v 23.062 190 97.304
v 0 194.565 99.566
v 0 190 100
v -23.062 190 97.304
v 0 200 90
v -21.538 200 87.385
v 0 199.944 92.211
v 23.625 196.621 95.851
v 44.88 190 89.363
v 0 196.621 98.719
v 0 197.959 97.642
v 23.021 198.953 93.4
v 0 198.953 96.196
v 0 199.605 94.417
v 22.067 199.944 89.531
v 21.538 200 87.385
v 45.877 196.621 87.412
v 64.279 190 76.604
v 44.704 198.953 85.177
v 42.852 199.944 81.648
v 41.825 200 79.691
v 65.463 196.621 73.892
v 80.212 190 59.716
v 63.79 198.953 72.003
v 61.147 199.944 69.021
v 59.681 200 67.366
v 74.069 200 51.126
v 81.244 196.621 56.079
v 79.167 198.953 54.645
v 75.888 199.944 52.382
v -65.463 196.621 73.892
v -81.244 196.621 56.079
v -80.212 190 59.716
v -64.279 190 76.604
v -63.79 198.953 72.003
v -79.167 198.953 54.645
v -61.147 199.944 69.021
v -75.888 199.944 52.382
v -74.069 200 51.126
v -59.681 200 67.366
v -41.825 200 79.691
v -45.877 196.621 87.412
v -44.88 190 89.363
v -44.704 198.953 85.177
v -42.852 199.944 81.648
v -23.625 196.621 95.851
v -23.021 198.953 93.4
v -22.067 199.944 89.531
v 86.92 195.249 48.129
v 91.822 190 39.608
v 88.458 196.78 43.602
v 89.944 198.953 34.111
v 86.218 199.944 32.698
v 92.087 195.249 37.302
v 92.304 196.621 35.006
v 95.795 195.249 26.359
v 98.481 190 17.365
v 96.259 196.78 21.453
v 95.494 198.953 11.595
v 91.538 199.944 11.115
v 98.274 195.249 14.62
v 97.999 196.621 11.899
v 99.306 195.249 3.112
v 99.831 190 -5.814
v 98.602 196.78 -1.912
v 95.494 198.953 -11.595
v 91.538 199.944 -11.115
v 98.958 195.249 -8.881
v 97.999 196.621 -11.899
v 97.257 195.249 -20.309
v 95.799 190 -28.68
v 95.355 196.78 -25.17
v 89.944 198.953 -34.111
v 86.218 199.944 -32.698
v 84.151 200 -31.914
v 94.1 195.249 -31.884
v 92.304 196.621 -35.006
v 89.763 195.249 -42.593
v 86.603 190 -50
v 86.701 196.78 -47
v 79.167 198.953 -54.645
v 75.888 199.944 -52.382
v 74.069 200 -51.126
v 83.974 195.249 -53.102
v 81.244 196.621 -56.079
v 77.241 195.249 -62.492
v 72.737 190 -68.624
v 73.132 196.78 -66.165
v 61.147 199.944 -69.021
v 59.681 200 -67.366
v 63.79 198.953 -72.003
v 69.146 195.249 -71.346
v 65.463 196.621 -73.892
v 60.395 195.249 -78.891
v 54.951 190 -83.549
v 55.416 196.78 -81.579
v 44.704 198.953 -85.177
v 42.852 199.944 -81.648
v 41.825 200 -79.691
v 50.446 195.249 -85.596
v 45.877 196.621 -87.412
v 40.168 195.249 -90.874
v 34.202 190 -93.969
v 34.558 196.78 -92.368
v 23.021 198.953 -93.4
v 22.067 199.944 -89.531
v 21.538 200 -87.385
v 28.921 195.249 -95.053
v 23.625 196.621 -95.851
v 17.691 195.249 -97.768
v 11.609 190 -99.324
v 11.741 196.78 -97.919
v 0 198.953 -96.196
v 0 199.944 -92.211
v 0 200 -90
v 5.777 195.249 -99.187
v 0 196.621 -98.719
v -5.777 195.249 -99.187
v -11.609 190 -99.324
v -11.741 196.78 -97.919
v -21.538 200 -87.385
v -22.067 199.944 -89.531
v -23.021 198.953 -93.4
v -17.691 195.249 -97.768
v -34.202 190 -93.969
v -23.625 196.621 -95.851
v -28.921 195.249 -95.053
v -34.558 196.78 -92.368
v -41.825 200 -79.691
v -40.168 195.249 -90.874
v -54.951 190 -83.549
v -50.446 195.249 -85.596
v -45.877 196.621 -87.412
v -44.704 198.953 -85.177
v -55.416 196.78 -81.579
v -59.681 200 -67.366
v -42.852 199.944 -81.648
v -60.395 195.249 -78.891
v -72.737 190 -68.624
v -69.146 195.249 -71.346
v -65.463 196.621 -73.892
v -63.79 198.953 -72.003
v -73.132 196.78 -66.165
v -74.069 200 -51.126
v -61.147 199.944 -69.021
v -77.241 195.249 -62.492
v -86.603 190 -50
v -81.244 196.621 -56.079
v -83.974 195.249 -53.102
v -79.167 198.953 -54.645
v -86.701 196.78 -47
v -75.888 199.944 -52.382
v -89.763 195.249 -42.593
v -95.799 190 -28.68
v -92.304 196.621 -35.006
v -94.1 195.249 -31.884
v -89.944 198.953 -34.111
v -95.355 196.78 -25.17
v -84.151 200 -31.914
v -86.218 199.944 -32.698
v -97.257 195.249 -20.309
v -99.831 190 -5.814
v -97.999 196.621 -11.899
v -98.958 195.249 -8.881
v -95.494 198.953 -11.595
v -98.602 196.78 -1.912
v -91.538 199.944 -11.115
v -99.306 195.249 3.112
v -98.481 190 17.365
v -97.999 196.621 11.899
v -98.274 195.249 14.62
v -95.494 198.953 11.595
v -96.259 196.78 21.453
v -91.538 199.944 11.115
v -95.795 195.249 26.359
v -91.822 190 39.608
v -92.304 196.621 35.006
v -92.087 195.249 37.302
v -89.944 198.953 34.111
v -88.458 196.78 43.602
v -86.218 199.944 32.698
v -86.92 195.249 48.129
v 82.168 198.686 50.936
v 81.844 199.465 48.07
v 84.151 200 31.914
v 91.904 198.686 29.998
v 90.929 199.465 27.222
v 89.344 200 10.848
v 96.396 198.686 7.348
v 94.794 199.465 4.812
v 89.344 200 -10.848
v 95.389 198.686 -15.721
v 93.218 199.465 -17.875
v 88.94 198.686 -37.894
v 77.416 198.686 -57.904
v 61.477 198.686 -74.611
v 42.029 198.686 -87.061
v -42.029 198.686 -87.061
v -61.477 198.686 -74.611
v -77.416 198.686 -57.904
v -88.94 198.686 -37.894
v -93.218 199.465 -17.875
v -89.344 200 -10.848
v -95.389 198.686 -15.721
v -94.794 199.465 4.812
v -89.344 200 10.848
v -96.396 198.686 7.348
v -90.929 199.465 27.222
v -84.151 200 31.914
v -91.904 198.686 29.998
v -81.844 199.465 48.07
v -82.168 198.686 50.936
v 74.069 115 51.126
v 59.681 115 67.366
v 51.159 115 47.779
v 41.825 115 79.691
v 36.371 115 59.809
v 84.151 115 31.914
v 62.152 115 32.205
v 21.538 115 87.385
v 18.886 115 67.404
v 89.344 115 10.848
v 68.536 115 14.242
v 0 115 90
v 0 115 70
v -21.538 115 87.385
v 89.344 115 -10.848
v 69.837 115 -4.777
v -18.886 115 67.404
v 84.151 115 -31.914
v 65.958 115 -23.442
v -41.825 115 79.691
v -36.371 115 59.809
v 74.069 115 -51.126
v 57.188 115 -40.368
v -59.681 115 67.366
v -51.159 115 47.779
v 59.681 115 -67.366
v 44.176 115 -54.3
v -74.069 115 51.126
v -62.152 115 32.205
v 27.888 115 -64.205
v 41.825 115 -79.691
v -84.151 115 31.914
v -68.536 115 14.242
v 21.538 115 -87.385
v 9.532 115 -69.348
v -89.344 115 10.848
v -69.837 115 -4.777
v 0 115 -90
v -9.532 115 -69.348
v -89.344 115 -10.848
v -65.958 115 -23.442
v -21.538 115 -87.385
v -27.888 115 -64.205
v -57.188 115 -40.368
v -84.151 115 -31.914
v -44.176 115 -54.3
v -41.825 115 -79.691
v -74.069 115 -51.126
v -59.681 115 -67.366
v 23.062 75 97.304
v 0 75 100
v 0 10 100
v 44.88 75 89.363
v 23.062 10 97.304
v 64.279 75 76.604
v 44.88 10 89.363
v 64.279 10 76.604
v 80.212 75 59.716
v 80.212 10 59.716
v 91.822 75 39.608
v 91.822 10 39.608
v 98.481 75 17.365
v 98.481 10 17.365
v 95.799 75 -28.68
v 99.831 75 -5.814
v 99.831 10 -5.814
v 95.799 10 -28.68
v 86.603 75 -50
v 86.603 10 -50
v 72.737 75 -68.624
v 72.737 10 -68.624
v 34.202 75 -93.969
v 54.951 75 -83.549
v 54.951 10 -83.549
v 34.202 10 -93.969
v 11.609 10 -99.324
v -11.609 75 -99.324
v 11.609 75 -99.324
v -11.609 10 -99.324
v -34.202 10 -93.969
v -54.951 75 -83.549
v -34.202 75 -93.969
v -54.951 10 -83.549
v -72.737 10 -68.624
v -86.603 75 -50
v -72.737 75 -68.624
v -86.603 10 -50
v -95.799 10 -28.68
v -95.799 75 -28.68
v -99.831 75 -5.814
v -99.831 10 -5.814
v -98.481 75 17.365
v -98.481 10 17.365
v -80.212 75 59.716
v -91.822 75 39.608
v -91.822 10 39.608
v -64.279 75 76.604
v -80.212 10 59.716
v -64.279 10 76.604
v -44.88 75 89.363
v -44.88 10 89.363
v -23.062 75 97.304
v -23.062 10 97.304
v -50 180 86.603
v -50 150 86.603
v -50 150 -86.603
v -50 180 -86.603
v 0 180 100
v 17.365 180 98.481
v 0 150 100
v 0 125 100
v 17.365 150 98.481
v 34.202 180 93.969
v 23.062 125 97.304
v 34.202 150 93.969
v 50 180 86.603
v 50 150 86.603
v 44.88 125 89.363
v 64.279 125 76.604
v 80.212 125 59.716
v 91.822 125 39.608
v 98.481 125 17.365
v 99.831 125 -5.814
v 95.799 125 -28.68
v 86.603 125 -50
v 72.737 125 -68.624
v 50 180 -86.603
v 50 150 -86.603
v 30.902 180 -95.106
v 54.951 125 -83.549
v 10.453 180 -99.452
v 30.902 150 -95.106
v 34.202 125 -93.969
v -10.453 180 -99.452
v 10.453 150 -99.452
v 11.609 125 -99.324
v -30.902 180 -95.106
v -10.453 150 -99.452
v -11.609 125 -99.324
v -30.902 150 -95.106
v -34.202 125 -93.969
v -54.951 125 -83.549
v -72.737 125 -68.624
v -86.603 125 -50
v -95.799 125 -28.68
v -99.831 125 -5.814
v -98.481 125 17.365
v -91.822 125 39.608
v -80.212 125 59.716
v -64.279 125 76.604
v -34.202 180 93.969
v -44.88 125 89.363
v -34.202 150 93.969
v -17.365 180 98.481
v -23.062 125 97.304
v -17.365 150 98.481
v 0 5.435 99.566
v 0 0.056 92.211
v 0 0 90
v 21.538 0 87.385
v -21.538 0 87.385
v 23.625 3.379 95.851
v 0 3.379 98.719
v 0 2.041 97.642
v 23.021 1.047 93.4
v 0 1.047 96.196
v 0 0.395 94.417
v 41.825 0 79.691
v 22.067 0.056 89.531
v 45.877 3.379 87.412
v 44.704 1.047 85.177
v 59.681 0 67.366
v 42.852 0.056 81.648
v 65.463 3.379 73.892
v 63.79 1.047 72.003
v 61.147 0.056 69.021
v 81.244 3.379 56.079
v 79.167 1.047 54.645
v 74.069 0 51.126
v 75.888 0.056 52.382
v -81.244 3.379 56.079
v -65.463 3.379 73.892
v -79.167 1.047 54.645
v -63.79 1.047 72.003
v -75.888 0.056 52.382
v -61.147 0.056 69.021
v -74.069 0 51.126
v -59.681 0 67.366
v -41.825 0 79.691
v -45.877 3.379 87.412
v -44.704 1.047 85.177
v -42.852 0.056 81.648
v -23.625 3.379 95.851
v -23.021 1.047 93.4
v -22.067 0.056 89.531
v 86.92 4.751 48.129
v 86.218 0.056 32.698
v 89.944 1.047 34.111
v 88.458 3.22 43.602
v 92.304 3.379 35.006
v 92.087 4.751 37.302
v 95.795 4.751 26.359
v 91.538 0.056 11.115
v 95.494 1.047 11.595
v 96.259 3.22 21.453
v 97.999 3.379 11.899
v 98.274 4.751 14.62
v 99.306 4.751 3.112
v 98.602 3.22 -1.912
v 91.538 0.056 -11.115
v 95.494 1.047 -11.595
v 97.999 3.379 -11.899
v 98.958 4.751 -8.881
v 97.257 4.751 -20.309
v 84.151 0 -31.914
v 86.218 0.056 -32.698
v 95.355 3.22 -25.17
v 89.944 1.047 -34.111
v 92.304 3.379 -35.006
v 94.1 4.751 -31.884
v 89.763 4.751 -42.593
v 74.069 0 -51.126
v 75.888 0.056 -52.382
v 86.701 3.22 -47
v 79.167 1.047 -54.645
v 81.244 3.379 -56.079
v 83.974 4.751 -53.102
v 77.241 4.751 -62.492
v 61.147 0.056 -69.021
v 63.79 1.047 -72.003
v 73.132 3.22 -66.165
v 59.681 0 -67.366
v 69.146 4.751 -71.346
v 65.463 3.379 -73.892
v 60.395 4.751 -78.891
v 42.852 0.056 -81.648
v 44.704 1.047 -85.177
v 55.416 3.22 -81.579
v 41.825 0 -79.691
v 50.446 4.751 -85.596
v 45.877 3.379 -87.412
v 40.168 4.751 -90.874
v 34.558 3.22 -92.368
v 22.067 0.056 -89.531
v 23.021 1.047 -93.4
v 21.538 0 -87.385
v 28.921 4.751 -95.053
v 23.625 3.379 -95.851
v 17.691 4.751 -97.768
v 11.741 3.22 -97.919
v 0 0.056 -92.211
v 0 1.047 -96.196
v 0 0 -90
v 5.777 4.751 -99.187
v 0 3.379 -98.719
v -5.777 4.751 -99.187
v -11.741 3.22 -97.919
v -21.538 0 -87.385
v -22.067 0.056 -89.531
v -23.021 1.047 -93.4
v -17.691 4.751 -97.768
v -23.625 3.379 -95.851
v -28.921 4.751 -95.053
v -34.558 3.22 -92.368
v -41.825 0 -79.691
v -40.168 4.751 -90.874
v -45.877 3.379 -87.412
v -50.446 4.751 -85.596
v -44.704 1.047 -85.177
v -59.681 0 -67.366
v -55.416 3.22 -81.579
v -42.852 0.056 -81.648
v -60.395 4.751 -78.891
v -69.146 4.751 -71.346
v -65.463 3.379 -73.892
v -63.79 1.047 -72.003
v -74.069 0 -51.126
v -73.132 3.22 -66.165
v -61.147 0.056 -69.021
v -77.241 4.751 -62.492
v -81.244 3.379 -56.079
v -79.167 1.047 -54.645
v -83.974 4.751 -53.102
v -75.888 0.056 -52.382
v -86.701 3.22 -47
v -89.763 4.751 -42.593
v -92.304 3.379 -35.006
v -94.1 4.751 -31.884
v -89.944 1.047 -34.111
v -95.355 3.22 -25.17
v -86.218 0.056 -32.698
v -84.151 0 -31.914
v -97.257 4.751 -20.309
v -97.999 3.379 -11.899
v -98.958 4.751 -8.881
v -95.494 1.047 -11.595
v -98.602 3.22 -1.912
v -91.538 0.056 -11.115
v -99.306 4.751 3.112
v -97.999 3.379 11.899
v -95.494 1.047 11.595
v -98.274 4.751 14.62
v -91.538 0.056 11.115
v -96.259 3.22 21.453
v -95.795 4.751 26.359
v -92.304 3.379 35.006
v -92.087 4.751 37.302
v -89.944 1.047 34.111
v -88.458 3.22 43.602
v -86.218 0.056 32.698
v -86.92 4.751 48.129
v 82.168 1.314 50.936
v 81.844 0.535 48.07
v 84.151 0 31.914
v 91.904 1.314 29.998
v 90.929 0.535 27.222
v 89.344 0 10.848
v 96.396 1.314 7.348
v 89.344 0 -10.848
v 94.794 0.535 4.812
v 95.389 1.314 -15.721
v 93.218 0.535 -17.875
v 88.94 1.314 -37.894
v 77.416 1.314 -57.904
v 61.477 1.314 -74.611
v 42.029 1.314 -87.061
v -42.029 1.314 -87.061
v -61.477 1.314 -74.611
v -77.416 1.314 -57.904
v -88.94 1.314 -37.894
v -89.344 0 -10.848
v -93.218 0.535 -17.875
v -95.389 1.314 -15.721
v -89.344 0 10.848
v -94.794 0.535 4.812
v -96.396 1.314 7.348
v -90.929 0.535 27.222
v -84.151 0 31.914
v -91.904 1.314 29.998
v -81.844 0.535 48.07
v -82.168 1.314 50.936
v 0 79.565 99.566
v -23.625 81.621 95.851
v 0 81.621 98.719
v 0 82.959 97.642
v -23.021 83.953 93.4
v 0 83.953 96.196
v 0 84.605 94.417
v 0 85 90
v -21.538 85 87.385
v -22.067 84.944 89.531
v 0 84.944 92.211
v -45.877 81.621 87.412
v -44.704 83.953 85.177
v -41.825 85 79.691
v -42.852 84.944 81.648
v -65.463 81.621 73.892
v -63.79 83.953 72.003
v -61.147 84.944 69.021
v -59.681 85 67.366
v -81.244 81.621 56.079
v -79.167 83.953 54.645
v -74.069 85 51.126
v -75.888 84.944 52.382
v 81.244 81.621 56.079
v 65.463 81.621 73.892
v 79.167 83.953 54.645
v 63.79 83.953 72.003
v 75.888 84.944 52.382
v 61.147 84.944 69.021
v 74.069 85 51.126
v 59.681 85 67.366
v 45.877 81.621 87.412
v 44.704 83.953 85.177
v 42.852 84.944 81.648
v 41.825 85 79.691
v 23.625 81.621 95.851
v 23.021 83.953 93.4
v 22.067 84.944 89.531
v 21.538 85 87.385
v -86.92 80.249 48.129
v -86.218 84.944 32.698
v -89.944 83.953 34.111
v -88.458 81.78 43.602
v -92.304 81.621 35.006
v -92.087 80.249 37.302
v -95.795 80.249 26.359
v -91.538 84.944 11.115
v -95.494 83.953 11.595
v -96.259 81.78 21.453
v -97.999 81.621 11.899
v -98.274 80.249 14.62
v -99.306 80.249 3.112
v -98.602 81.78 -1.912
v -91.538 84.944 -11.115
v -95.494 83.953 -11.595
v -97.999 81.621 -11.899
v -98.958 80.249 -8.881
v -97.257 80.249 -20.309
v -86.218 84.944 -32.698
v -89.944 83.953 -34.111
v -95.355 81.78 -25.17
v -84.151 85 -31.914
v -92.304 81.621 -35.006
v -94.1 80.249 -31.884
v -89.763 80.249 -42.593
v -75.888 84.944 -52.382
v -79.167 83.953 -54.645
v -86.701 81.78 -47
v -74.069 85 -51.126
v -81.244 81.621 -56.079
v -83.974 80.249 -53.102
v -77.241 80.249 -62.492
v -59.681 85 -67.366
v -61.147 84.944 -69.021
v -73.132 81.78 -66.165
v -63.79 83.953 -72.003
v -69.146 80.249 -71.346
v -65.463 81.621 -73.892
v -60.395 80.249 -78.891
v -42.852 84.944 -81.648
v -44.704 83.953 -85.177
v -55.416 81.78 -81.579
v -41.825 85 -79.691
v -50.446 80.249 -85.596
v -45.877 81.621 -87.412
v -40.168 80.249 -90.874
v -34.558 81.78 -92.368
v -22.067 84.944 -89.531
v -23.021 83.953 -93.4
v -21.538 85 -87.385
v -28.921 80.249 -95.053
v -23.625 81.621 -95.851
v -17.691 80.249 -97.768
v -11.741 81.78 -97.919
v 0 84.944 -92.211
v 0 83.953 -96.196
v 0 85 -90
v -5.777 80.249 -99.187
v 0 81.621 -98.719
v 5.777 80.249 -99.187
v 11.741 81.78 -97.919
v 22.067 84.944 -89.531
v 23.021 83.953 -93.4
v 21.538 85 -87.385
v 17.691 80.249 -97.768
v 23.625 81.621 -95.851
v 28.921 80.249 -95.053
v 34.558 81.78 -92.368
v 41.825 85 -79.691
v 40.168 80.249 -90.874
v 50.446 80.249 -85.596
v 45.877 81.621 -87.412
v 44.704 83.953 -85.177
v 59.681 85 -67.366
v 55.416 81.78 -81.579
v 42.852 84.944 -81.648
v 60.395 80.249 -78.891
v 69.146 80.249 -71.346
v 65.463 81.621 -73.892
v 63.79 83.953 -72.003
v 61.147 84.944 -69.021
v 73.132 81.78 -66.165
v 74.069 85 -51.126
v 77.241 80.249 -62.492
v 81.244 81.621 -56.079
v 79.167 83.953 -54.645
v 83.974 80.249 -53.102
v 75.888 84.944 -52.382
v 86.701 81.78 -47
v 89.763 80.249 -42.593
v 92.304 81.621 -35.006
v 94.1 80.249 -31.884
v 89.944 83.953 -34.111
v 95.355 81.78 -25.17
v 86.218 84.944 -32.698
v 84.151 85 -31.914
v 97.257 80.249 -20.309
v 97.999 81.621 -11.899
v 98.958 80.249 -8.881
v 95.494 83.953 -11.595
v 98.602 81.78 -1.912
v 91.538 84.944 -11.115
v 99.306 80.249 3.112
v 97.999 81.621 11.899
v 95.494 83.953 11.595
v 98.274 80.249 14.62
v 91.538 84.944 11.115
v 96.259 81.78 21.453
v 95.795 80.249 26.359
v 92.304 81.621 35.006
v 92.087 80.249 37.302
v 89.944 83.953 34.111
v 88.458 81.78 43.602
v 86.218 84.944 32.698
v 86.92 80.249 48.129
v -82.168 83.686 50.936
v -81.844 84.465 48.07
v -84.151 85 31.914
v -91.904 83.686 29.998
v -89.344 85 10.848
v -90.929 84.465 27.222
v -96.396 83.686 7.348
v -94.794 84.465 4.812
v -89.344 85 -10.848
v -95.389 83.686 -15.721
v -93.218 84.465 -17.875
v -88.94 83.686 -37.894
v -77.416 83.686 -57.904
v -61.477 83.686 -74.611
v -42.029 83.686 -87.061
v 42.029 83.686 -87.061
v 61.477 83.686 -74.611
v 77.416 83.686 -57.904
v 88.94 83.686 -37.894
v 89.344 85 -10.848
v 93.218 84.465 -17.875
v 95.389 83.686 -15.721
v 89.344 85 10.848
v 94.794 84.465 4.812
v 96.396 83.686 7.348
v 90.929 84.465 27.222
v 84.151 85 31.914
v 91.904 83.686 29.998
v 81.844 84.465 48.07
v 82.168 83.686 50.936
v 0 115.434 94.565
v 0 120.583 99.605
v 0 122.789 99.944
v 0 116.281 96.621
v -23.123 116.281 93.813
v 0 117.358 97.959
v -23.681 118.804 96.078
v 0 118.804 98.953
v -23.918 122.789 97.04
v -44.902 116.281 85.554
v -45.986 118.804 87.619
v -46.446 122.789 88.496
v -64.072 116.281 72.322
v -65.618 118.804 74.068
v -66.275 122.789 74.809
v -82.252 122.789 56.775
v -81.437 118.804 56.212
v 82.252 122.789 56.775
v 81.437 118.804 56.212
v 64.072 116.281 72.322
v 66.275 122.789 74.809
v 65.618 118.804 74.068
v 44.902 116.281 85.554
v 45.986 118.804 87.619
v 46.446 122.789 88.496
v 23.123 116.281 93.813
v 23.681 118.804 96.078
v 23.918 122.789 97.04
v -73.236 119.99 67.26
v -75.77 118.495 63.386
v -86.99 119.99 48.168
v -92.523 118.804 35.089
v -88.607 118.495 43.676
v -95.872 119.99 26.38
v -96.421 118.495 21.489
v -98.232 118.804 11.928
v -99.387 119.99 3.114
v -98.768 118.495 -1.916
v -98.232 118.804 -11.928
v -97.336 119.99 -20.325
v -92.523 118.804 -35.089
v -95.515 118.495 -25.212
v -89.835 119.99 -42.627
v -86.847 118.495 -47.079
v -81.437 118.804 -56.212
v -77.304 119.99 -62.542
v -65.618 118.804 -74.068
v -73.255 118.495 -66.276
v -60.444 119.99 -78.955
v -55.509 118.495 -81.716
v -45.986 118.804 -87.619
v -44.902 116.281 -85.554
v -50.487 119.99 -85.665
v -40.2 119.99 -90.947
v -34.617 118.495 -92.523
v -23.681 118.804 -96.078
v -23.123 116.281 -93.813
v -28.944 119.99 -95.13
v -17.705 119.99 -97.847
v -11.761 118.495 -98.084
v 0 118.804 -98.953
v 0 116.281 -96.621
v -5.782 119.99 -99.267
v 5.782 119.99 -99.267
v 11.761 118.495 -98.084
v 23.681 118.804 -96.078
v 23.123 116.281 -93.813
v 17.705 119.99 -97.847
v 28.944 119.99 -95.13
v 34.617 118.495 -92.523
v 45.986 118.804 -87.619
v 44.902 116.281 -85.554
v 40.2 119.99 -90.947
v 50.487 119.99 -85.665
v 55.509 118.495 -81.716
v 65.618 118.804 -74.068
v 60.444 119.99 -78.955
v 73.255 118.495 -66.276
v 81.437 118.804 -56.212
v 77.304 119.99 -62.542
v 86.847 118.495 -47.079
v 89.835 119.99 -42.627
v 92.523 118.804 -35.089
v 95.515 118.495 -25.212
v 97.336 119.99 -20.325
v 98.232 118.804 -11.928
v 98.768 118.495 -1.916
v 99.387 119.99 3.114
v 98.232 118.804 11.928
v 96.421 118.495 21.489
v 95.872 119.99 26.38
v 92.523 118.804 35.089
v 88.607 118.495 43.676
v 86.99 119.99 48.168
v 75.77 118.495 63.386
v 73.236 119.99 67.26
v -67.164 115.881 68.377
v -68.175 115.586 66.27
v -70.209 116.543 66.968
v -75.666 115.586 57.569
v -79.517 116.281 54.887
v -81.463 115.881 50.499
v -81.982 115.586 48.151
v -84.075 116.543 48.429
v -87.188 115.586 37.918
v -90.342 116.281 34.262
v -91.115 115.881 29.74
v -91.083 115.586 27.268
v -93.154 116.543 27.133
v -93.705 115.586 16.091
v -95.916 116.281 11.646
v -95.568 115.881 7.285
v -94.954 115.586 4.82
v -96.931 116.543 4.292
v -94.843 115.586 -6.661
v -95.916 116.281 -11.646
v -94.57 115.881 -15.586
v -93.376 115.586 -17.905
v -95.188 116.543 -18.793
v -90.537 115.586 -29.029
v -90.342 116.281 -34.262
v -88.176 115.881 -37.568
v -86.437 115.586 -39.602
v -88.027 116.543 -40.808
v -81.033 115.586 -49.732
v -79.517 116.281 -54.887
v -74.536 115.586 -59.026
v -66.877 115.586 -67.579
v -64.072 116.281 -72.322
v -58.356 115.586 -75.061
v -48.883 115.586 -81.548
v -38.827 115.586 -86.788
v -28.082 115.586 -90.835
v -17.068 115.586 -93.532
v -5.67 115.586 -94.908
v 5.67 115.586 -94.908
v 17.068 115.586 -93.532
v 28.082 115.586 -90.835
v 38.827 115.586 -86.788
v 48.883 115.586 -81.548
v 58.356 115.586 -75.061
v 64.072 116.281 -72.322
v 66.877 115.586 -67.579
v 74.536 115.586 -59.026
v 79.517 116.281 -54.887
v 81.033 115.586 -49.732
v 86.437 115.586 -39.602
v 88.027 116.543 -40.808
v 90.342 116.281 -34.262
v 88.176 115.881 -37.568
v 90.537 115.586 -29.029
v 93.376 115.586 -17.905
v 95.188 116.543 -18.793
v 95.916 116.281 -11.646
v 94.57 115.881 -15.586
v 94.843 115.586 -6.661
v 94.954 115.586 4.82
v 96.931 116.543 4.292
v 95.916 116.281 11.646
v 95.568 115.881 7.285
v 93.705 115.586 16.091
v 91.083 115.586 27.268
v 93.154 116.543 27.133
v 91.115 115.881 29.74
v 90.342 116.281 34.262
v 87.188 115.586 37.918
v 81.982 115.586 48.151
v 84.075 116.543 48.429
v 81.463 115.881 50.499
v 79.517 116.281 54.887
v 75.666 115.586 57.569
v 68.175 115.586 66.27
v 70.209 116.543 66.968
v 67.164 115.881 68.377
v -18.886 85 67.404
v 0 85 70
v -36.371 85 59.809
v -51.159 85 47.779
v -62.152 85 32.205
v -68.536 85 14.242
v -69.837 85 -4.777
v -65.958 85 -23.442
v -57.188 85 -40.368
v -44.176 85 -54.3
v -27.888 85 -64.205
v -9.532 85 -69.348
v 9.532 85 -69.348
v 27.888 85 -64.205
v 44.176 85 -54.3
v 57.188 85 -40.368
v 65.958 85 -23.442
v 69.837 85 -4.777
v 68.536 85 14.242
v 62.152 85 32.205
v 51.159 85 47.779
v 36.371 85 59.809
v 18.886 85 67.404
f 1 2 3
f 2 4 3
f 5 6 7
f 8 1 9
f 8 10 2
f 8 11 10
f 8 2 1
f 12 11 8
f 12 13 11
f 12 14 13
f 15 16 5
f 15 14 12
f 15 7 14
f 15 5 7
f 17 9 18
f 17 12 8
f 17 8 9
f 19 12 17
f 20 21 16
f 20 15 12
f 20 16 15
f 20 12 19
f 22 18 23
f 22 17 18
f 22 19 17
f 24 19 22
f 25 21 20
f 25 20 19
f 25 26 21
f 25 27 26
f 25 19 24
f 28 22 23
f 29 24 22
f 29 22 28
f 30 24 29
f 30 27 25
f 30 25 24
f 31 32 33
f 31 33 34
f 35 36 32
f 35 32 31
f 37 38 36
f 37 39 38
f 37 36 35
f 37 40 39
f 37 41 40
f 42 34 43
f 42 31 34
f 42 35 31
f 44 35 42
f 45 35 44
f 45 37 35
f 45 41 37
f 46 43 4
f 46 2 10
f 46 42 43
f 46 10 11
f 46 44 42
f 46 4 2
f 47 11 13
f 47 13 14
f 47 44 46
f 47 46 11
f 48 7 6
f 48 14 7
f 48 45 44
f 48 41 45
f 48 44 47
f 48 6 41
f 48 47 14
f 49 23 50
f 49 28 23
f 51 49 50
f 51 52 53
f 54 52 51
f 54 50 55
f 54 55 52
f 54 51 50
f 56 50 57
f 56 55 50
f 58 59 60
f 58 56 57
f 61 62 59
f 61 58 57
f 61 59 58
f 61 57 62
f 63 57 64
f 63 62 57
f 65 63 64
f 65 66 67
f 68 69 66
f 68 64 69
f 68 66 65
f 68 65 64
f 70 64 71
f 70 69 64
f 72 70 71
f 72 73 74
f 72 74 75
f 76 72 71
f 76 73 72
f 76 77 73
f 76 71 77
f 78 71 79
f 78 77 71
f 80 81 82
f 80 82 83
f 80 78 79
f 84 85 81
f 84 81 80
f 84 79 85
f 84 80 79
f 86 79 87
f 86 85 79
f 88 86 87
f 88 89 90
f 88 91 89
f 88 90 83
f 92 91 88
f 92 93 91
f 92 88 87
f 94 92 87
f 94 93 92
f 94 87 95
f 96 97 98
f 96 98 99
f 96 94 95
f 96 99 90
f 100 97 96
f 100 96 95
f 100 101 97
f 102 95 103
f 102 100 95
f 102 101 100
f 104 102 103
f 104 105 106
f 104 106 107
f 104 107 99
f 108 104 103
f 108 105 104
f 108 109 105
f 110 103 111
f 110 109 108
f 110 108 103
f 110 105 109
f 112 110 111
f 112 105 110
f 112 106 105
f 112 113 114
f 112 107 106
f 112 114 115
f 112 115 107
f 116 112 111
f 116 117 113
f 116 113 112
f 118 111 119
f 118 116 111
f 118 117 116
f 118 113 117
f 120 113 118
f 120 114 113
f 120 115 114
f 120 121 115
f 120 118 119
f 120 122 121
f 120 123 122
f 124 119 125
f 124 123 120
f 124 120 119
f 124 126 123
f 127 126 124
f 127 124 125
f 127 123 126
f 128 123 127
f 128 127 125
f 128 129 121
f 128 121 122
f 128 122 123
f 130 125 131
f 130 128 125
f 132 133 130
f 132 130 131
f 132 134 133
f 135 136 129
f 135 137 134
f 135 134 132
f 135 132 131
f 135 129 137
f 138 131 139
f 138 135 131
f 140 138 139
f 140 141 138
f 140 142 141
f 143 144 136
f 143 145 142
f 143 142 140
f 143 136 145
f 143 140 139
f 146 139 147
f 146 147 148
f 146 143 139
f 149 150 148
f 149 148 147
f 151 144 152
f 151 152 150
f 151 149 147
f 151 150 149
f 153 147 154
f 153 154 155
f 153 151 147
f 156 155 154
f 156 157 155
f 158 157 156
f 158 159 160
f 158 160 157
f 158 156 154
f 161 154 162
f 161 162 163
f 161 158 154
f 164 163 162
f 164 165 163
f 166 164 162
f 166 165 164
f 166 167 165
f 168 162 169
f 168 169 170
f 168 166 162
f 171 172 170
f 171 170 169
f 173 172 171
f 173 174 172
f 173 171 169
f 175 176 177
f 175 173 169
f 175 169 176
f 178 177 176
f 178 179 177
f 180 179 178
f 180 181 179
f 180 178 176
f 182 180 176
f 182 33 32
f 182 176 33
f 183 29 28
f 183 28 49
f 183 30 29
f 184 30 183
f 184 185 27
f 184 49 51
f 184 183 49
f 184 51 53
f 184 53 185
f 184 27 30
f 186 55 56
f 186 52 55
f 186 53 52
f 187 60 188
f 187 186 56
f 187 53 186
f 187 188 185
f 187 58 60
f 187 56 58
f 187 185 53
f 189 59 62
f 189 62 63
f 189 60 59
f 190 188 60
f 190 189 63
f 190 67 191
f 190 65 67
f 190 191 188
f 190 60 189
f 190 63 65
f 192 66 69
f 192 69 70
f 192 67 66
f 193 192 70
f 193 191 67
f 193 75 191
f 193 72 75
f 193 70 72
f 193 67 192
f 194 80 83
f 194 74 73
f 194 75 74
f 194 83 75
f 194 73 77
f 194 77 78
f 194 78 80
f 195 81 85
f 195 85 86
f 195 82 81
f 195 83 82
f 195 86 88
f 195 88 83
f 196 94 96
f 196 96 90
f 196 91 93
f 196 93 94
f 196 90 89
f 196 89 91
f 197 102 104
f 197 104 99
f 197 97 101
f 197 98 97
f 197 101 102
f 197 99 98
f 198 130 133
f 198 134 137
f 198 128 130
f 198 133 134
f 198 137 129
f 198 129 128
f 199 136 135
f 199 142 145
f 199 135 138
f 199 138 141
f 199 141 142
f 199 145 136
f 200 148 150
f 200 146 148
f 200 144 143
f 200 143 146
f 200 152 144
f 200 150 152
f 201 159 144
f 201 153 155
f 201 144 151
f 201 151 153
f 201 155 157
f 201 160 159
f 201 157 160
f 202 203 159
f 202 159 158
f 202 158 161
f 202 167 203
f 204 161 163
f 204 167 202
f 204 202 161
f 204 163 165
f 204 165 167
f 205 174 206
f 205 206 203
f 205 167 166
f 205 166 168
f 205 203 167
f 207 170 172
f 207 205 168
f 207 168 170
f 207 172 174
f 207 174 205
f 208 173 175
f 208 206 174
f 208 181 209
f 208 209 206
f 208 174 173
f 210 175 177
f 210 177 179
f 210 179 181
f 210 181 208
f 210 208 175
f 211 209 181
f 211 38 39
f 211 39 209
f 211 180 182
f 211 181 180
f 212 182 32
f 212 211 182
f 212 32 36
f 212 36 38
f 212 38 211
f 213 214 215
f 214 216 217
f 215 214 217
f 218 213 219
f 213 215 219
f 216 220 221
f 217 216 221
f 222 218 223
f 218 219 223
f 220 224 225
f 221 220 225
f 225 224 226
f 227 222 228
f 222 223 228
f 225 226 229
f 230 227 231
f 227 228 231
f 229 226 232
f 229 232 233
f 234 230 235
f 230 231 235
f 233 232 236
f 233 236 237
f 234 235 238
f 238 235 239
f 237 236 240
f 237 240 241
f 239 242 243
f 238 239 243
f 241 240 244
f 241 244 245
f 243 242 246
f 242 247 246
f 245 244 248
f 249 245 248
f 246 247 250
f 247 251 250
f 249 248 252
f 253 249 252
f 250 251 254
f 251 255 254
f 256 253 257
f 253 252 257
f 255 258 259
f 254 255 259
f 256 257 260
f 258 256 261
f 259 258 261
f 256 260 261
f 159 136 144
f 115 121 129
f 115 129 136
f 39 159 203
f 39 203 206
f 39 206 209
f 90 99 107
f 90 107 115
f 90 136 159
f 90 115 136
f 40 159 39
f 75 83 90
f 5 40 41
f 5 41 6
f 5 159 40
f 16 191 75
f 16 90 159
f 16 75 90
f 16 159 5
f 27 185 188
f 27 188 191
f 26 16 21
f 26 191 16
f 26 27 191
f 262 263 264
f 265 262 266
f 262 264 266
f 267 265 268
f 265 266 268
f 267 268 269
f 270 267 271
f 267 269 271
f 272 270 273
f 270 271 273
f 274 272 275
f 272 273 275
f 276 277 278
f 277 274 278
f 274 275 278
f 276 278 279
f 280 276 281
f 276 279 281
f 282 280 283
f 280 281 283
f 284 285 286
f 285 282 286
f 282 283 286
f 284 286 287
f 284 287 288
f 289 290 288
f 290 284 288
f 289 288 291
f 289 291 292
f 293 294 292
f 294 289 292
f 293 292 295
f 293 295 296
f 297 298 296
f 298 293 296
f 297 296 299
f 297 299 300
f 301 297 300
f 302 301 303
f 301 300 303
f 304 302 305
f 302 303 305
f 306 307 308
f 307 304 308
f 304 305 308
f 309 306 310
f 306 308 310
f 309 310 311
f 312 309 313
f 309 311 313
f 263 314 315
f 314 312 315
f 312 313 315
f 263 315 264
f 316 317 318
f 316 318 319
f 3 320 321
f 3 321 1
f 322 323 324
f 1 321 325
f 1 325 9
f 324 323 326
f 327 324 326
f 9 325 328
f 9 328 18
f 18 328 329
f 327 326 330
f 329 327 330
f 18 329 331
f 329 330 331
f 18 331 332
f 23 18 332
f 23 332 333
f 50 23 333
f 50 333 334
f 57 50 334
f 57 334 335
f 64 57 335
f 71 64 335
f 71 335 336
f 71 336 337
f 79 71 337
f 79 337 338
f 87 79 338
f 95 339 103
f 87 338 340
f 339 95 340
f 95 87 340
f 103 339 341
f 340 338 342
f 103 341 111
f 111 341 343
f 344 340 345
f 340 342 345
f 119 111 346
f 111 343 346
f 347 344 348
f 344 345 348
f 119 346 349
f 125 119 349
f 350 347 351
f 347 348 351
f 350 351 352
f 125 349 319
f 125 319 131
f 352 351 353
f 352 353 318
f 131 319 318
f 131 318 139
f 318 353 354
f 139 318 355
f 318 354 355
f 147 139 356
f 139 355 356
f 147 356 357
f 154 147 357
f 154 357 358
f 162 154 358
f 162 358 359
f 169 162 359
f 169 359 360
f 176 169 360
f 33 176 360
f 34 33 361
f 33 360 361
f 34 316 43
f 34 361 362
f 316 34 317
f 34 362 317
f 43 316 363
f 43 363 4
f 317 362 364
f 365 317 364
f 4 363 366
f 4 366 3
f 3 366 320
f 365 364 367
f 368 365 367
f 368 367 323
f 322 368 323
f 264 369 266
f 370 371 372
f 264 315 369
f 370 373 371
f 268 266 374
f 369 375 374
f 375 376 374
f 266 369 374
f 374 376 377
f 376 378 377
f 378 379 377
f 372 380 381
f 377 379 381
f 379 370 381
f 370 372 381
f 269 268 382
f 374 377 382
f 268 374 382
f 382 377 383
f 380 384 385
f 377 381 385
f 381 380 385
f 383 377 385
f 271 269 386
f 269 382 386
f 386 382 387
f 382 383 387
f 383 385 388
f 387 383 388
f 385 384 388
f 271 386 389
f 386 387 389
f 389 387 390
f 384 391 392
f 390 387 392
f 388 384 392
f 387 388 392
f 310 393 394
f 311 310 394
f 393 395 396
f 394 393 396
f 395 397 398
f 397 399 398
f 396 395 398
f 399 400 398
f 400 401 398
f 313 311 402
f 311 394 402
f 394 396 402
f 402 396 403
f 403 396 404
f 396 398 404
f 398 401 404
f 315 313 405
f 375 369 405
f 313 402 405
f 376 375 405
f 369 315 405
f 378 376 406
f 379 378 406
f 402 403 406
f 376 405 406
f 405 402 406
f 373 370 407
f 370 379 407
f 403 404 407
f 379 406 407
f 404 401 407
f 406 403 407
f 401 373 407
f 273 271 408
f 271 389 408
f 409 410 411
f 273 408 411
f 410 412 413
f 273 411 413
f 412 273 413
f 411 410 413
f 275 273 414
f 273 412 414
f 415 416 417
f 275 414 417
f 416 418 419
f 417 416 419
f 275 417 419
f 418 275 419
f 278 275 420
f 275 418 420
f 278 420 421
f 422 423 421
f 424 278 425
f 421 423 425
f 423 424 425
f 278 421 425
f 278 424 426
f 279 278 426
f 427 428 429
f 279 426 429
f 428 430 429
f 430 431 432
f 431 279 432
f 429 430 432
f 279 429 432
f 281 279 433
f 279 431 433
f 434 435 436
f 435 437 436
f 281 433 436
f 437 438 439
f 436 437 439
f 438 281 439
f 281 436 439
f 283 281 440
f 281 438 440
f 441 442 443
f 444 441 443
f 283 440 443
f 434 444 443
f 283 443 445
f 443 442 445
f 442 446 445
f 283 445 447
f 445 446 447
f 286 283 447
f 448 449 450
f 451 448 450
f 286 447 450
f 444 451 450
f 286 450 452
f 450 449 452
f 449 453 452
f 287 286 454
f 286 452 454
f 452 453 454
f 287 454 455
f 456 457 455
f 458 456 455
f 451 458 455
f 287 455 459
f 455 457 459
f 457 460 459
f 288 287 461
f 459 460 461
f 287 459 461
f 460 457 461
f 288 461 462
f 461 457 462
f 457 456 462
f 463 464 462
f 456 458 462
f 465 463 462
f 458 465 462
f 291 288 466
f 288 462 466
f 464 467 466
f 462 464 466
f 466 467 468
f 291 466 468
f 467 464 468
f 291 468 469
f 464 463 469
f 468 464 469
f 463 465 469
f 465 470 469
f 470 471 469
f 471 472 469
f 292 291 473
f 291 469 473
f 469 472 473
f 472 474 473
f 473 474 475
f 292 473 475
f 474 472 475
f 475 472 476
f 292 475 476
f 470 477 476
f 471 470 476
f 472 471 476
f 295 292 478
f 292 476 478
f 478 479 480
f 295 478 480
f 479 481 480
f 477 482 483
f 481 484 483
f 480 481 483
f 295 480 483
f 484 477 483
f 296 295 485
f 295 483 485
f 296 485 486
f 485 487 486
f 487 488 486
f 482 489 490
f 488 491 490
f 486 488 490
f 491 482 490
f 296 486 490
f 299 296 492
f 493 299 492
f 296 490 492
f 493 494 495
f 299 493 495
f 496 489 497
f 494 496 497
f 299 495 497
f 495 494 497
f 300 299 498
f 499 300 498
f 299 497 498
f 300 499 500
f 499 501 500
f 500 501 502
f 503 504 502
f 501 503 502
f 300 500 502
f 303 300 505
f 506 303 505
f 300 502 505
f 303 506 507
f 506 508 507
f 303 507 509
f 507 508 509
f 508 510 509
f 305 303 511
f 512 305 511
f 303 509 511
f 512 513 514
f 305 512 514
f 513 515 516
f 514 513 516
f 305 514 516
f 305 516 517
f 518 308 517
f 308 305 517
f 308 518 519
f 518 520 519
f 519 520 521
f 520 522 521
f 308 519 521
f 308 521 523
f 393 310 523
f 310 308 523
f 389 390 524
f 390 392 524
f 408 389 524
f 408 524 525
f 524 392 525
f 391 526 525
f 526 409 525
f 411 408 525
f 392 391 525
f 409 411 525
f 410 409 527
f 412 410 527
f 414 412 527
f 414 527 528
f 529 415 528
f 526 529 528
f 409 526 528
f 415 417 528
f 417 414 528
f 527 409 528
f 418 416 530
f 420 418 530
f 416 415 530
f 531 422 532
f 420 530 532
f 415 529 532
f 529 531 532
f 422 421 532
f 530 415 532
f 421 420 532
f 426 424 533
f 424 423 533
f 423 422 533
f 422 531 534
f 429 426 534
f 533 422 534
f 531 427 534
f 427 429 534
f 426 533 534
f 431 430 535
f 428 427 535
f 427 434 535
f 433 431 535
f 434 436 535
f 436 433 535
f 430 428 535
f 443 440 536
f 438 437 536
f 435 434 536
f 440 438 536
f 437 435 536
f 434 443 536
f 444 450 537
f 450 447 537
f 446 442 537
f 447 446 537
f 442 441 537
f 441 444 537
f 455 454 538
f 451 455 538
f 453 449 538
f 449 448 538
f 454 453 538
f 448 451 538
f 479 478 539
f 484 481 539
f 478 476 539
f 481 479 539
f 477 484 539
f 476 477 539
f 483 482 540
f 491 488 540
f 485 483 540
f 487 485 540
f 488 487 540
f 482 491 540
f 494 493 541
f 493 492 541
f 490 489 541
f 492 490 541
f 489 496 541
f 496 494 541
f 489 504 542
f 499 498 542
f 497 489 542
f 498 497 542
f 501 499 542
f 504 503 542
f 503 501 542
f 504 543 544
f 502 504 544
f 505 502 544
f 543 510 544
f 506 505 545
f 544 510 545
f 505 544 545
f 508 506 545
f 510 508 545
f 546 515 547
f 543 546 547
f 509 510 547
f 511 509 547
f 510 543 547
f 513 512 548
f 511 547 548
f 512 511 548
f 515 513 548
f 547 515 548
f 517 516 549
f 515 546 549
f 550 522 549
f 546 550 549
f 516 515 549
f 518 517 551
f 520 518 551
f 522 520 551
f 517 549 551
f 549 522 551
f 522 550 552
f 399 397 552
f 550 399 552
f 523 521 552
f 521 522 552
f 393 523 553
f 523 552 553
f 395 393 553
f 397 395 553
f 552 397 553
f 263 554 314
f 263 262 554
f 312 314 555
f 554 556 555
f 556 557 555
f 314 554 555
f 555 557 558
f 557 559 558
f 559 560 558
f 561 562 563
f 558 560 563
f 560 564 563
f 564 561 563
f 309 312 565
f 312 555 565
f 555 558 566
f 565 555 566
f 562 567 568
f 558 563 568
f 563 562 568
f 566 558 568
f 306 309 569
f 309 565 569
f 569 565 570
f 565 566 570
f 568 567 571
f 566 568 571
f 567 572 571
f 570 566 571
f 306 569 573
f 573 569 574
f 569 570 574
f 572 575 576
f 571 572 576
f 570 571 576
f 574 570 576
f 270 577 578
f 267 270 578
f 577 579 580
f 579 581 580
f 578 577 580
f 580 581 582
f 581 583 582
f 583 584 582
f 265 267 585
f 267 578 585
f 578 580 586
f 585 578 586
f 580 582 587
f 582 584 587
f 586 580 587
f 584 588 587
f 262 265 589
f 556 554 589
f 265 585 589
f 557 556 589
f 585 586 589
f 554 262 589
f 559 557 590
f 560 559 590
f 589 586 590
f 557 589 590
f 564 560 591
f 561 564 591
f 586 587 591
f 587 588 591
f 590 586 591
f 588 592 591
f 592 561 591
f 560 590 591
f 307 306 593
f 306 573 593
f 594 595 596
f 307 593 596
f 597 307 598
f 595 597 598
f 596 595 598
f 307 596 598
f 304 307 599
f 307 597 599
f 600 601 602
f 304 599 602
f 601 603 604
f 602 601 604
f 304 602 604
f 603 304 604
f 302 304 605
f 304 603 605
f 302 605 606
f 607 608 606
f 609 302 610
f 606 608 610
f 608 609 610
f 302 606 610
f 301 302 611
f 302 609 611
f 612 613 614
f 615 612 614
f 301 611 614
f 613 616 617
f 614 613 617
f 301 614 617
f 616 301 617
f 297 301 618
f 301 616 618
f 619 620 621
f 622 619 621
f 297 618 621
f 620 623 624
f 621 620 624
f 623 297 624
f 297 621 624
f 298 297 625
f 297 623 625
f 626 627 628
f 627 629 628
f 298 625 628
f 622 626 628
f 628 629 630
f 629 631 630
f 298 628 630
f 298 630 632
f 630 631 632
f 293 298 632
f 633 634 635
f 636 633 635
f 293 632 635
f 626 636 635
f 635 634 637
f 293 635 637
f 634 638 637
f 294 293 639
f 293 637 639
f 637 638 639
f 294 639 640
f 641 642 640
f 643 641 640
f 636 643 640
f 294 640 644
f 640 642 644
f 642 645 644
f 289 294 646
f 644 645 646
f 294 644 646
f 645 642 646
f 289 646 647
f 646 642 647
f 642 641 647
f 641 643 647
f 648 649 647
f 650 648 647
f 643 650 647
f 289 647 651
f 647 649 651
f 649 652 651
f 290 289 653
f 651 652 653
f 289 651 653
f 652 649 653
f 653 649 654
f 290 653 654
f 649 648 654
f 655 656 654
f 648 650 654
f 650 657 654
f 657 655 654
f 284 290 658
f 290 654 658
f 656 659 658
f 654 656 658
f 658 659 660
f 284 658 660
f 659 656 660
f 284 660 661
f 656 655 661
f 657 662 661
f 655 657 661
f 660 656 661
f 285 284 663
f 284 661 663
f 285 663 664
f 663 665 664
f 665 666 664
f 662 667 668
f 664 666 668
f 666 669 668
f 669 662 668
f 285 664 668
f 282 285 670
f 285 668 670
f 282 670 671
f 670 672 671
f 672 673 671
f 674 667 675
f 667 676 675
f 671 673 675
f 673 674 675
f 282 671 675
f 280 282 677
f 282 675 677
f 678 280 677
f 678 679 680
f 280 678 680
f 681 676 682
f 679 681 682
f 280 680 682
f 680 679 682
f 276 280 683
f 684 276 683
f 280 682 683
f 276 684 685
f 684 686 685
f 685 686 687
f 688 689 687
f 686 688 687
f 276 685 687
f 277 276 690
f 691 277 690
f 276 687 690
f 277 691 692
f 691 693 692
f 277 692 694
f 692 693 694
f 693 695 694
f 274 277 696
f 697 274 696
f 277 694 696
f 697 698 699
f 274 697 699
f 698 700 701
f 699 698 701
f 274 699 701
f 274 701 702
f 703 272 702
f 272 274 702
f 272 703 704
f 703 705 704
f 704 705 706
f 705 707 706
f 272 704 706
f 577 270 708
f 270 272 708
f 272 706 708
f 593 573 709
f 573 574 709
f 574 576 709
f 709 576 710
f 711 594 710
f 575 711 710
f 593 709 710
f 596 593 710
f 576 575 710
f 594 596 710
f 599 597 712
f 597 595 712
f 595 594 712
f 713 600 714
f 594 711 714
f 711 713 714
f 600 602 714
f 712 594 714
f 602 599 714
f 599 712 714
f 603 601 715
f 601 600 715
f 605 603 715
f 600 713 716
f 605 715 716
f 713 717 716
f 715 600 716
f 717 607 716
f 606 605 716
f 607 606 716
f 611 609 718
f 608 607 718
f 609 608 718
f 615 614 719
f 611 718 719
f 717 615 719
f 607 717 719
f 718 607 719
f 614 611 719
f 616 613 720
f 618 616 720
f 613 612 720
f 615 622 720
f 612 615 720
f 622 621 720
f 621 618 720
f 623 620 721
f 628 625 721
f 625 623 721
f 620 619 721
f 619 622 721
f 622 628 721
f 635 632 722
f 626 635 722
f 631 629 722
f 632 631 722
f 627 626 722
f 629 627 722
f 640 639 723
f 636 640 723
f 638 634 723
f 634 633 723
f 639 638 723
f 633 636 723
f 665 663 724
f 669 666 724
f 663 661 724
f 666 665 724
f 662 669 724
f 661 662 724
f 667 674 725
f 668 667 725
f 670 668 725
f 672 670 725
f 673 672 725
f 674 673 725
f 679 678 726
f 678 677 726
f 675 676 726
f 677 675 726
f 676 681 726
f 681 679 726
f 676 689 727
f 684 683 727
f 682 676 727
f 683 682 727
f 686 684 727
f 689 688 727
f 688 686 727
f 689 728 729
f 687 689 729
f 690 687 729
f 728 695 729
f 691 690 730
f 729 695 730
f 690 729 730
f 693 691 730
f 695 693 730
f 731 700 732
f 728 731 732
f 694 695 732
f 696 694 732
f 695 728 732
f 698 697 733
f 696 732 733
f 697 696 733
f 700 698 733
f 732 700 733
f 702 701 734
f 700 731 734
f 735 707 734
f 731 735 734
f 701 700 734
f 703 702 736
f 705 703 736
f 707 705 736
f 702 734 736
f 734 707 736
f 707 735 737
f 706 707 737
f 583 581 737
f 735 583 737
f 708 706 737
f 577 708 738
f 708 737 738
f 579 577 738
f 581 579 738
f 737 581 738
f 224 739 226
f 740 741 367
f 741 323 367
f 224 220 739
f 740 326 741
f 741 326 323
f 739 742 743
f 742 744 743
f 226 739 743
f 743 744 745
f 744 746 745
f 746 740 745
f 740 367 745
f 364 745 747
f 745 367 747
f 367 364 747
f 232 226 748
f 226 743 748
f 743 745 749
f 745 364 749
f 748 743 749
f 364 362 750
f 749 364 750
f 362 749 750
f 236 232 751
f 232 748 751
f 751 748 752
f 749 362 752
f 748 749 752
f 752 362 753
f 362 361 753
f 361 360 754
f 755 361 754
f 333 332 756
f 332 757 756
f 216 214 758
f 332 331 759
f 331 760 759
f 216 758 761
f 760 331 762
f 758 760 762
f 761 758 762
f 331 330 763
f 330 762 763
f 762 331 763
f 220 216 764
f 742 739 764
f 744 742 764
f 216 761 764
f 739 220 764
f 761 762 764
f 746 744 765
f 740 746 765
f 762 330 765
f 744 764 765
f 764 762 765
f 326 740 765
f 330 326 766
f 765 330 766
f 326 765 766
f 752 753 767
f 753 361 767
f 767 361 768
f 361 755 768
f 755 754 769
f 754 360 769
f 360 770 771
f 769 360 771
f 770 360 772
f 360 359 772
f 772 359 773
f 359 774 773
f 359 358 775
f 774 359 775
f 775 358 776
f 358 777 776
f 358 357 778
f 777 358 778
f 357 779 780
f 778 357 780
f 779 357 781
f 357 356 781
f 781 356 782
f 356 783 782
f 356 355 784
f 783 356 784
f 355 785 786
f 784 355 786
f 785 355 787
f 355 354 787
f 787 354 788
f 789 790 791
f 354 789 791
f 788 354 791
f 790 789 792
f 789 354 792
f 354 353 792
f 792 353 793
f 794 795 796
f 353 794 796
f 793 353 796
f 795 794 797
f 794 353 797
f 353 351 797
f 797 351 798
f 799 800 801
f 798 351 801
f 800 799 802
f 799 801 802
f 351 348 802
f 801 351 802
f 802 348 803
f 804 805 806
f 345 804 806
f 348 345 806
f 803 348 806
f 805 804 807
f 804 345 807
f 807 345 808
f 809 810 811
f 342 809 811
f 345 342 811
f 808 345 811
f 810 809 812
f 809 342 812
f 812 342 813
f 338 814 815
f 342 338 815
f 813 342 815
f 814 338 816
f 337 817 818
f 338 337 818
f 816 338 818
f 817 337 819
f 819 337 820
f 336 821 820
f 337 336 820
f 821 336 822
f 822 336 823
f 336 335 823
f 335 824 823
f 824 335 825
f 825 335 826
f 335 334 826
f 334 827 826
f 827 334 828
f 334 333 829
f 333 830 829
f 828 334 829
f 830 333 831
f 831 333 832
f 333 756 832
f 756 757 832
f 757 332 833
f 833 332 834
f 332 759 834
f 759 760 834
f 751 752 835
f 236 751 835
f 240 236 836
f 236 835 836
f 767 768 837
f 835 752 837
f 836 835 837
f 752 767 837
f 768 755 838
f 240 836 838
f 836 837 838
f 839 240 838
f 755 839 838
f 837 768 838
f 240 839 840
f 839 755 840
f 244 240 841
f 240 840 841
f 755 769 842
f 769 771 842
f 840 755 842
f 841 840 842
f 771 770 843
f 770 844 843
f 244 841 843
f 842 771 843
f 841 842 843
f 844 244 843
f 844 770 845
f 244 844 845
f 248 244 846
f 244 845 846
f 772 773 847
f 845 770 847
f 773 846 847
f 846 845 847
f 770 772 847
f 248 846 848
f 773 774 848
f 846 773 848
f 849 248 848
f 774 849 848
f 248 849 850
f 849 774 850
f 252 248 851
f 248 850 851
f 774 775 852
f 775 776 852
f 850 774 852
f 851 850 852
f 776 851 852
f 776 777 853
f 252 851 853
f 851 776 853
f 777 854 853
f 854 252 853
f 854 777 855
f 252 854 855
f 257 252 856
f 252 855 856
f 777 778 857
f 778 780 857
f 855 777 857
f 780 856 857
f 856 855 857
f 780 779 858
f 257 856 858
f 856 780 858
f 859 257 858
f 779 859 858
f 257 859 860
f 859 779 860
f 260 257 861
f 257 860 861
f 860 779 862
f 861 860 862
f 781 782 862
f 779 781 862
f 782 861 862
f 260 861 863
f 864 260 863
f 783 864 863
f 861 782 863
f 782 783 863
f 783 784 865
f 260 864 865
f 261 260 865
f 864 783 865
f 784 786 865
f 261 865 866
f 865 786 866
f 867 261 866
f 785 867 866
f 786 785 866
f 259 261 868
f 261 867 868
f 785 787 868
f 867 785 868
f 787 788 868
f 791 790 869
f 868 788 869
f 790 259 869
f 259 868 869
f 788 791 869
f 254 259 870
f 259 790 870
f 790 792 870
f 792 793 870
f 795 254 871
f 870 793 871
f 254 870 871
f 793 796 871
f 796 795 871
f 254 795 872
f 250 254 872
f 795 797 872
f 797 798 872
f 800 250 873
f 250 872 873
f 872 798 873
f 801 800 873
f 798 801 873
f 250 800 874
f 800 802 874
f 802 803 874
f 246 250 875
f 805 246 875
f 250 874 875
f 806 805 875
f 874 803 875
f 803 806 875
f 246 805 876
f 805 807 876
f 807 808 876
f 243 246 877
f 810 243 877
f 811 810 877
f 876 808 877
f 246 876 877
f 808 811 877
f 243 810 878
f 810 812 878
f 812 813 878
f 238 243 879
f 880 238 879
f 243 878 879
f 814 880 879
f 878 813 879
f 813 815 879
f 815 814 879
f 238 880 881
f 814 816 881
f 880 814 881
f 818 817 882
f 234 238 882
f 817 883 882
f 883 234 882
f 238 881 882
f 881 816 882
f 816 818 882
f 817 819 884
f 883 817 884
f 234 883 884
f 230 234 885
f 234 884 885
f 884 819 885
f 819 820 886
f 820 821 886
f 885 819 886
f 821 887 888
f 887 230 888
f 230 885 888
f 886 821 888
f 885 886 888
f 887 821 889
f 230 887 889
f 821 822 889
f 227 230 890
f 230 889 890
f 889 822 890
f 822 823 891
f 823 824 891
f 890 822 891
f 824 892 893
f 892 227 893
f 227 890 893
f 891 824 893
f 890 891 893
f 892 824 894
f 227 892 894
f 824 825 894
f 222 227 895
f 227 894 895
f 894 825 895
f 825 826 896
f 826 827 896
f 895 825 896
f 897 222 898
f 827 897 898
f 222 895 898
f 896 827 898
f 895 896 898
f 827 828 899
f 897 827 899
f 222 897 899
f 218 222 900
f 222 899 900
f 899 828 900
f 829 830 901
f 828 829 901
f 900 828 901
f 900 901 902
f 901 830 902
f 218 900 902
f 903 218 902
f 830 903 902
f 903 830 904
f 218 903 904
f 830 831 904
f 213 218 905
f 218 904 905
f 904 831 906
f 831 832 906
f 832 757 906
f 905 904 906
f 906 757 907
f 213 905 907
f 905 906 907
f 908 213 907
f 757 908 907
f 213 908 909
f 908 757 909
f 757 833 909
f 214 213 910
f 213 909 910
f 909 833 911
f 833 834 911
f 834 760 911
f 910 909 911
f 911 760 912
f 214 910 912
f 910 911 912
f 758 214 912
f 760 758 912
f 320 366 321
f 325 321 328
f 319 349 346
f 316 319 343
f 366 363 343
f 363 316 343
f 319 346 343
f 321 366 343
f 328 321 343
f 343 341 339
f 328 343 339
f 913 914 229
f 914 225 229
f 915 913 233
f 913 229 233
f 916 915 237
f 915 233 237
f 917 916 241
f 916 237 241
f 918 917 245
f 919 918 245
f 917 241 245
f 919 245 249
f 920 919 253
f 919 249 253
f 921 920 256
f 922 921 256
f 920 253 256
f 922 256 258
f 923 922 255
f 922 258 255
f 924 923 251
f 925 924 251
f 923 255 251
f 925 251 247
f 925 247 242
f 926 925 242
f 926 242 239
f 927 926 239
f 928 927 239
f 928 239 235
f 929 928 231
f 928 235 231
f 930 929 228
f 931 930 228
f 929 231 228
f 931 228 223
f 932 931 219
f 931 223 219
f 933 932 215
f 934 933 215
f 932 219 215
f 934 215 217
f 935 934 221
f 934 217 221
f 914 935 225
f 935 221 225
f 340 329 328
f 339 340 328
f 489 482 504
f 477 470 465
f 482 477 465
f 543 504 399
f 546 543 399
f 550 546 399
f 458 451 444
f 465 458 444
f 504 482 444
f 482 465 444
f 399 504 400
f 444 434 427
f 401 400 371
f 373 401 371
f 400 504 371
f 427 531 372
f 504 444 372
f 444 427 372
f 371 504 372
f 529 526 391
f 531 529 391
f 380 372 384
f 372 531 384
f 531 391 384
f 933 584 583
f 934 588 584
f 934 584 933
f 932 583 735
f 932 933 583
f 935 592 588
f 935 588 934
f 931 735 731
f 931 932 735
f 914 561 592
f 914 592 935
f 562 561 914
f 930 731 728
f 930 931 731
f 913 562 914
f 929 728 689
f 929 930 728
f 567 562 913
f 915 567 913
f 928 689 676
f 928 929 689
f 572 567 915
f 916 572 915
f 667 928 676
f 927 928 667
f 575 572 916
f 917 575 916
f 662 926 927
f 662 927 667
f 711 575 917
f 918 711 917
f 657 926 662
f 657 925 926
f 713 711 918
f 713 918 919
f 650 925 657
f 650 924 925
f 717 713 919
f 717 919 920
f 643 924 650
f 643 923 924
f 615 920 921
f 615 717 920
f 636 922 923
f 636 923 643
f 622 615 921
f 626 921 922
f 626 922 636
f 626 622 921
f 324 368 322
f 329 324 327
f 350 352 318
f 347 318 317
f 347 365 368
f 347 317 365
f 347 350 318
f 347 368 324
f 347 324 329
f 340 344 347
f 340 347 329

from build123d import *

# Parameters (mm, degrees)
SKETCH2_R               = 100
BOSS_EXTRUDE1_DEPTH     = 200
SKETCH3_W               = 30
SKETCH3_H               = 30
CUT_EXTRUDE1_DEPTH      = 245.948974278
CUT_EXTRUDE1_DEPTH_BACK = 245.948974278
SKETCH4_W               = 100
SKETCH4_H               = 30
FILLET2_SIZE            = 10


with BuildPart() as part:
    # Sketch2 → Boss-Extrude1 (new body)
    with BuildSketch(Plane(origin=(0, 0, 0), x_dir=(1, 0, 0), z_dir=(0, 1, 0))):
        with Locations(Location((0, 0, 0), (0, 0, 270))):
            Circle(SKETCH2_R)
    extrude(amount=BOSS_EXTRUDE1_DEPTH)

    # Sketch3 → Cut-Revolve1 (revolve, cut)
    with BuildSketch(Plane(origin=(0, 0, 0), x_dir=(0, 0, -1), z_dir=(1, 0, 0)), mode=Mode.PRIVATE) as cut_revolve1_sk:
        with Locations((85, 100)):
            Rectangle(SKETCH3_W, SKETCH3_H)
    revolve(cut_revolve1_sk.sketch.rotate(Axis((0, 200, 0), (0, -1, 0)), 180), axis=Axis((0, 200, 0), (0, -1, 0)), mode=Mode.SUBTRACT)

    # Sketch4 → Cut-Extrude1 (cut, two sides: drawn at the far end of the back side and taken through both)
    with BuildSketch(Plane.XY.offset(-CUT_EXTRUDE1_DEPTH_BACK)):
        with Locations((0, 165)):
            Rectangle(SKETCH4_W, SKETCH4_H)
    extrude(amount=CUT_EXTRUDE1_DEPTH + CUT_EXTRUDE1_DEPTH_BACK, mode=Mode.SUBTRACT)

    # Fillet2
    # a fillet whose section is not a circle: 10 mm, written as the material it takes off along each edge
    with BuildSketch(Plane(origin=(0, 0, 0), x_dir=(0, 0, 1), z_dir=(-1, 0, 0))) as fillet2_piece_1:
        with BuildLine():
            add(Edge.make_bspline([(100, FILLET2_SIZE), (100, FILLET2_SIZE * 0.831801948466), (100, FILLET2_SIZE * 0.663603896932), (100 - FILLET2_SIZE * 0.0716919198361, FILLET2_SIZE * 0.292893218813), (100 - FILLET2_SIZE * 0.292893218813, FILLET2_SIZE * 0.0716919198361), (100 - FILLET2_SIZE * 0.663603896932, 0), (100 - FILLET2_SIZE * 0.831801948466, 0), (100 - FILLET2_SIZE, 0)], knots=[0, 0, 0, 0, 0, 0, 0.5, 0.5, 1, 1, 1, 1, 1, 1], degree=5))
            Line((100 - FILLET2_SIZE, 0), (100, 0))
            Line((100, 0), (100, FILLET2_SIZE))
        make_face()
    revolve(axis=Axis((0, 0, 0), (0, 1, 0)), mode=Mode.SUBTRACT)
    with BuildSketch(Plane(origin=(0, 200, 0), x_dir=(0, 0, 1), z_dir=(-1, 0, 0))) as fillet2_piece_2:
        with BuildLine():
            add(Edge.make_bspline([(100, -FILLET2_SIZE), (100, -FILLET2_SIZE * 0.831801948466), (100, -FILLET2_SIZE * 0.663603896932), (100 - FILLET2_SIZE * 0.0716919198361, -FILLET2_SIZE * 0.292893218813), (100 - FILLET2_SIZE * 0.292893218813, -FILLET2_SIZE * 0.0716919198361), (100 - FILLET2_SIZE * 0.663603896932, 0), (100 - FILLET2_SIZE * 0.831801948466, 0), (100 - FILLET2_SIZE, 0)], knots=[0, 0, 0, 0, 0, 0, 0.5, 0.5, 1, 1, 1, 1, 1, 1], degree=5))
            Line((100 - FILLET2_SIZE, 0), (100, 0))
            Line((100, 0), (100, -FILLET2_SIZE))
        make_face()
    revolve(axis=Axis((0, 200, 0), (0, 1, 0)), mode=Mode.SUBTRACT)
    with BuildSketch(Plane(origin=(0, 85, 0), x_dir=(0, 0, 1), z_dir=(1, 0, 0))) as fillet2_piece_3:
        with BuildLine():
            add(Edge.make_bspline([(100, FILLET2_SIZE), (100, FILLET2_SIZE * 0.831801948466), (100, FILLET2_SIZE * 0.663603896932), (100 - FILLET2_SIZE * 0.0716919198361, FILLET2_SIZE * 0.292893218813), (100 - FILLET2_SIZE * 0.292893218813, FILLET2_SIZE * 0.0716919198361), (100 - FILLET2_SIZE * 0.663603896932, 0), (100 - FILLET2_SIZE * 0.831801948466, 0), (100 - FILLET2_SIZE, 0)], knots=[0, 0, 0, 0, 0, 0, 0.5, 0.5, 1, 1, 1, 1, 1, 1], degree=5))
            Line((100 - FILLET2_SIZE, 0), (100, 0))
            Line((100, 0), (100, FILLET2_SIZE))
        make_face()
    revolve(axis=Axis((0, 85, 0), (0, -1, 0)), mode=Mode.SUBTRACT)
    with BuildSketch(Plane(origin=(0, 115, 0), x_dir=(0, 0, 1), z_dir=(1, 0, 0))) as fillet2_piece_4:
        with BuildLine():
            add(Edge.make_bspline([(100 - FILLET2_SIZE, 0), (100 - FILLET2_SIZE * 0.831801948466, 0), (100 - FILLET2_SIZE * 0.663603896932, 0), (100 - FILLET2_SIZE * 0.292893218813, -FILLET2_SIZE * 0.0716919198361), (100 - FILLET2_SIZE * 0.0716919198361, -FILLET2_SIZE * 0.292893218813), (100, -FILLET2_SIZE * 0.663603896932), (100, -FILLET2_SIZE * 0.831801948466), (100, -FILLET2_SIZE)], knots=[0, 0, 0, 0, 0, 0, 0.5, 0.5, 1, 1, 1, 1, 1, 1], degree=5))
            Line((100, -FILLET2_SIZE), (100, 0))
            Line((100, 0), (100 - FILLET2_SIZE, 0))
        make_face()
    revolve(axis=Axis((0, 115, 0), (0, -1, 0)), mode=Mode.SUBTRACT)


solid = part.part
